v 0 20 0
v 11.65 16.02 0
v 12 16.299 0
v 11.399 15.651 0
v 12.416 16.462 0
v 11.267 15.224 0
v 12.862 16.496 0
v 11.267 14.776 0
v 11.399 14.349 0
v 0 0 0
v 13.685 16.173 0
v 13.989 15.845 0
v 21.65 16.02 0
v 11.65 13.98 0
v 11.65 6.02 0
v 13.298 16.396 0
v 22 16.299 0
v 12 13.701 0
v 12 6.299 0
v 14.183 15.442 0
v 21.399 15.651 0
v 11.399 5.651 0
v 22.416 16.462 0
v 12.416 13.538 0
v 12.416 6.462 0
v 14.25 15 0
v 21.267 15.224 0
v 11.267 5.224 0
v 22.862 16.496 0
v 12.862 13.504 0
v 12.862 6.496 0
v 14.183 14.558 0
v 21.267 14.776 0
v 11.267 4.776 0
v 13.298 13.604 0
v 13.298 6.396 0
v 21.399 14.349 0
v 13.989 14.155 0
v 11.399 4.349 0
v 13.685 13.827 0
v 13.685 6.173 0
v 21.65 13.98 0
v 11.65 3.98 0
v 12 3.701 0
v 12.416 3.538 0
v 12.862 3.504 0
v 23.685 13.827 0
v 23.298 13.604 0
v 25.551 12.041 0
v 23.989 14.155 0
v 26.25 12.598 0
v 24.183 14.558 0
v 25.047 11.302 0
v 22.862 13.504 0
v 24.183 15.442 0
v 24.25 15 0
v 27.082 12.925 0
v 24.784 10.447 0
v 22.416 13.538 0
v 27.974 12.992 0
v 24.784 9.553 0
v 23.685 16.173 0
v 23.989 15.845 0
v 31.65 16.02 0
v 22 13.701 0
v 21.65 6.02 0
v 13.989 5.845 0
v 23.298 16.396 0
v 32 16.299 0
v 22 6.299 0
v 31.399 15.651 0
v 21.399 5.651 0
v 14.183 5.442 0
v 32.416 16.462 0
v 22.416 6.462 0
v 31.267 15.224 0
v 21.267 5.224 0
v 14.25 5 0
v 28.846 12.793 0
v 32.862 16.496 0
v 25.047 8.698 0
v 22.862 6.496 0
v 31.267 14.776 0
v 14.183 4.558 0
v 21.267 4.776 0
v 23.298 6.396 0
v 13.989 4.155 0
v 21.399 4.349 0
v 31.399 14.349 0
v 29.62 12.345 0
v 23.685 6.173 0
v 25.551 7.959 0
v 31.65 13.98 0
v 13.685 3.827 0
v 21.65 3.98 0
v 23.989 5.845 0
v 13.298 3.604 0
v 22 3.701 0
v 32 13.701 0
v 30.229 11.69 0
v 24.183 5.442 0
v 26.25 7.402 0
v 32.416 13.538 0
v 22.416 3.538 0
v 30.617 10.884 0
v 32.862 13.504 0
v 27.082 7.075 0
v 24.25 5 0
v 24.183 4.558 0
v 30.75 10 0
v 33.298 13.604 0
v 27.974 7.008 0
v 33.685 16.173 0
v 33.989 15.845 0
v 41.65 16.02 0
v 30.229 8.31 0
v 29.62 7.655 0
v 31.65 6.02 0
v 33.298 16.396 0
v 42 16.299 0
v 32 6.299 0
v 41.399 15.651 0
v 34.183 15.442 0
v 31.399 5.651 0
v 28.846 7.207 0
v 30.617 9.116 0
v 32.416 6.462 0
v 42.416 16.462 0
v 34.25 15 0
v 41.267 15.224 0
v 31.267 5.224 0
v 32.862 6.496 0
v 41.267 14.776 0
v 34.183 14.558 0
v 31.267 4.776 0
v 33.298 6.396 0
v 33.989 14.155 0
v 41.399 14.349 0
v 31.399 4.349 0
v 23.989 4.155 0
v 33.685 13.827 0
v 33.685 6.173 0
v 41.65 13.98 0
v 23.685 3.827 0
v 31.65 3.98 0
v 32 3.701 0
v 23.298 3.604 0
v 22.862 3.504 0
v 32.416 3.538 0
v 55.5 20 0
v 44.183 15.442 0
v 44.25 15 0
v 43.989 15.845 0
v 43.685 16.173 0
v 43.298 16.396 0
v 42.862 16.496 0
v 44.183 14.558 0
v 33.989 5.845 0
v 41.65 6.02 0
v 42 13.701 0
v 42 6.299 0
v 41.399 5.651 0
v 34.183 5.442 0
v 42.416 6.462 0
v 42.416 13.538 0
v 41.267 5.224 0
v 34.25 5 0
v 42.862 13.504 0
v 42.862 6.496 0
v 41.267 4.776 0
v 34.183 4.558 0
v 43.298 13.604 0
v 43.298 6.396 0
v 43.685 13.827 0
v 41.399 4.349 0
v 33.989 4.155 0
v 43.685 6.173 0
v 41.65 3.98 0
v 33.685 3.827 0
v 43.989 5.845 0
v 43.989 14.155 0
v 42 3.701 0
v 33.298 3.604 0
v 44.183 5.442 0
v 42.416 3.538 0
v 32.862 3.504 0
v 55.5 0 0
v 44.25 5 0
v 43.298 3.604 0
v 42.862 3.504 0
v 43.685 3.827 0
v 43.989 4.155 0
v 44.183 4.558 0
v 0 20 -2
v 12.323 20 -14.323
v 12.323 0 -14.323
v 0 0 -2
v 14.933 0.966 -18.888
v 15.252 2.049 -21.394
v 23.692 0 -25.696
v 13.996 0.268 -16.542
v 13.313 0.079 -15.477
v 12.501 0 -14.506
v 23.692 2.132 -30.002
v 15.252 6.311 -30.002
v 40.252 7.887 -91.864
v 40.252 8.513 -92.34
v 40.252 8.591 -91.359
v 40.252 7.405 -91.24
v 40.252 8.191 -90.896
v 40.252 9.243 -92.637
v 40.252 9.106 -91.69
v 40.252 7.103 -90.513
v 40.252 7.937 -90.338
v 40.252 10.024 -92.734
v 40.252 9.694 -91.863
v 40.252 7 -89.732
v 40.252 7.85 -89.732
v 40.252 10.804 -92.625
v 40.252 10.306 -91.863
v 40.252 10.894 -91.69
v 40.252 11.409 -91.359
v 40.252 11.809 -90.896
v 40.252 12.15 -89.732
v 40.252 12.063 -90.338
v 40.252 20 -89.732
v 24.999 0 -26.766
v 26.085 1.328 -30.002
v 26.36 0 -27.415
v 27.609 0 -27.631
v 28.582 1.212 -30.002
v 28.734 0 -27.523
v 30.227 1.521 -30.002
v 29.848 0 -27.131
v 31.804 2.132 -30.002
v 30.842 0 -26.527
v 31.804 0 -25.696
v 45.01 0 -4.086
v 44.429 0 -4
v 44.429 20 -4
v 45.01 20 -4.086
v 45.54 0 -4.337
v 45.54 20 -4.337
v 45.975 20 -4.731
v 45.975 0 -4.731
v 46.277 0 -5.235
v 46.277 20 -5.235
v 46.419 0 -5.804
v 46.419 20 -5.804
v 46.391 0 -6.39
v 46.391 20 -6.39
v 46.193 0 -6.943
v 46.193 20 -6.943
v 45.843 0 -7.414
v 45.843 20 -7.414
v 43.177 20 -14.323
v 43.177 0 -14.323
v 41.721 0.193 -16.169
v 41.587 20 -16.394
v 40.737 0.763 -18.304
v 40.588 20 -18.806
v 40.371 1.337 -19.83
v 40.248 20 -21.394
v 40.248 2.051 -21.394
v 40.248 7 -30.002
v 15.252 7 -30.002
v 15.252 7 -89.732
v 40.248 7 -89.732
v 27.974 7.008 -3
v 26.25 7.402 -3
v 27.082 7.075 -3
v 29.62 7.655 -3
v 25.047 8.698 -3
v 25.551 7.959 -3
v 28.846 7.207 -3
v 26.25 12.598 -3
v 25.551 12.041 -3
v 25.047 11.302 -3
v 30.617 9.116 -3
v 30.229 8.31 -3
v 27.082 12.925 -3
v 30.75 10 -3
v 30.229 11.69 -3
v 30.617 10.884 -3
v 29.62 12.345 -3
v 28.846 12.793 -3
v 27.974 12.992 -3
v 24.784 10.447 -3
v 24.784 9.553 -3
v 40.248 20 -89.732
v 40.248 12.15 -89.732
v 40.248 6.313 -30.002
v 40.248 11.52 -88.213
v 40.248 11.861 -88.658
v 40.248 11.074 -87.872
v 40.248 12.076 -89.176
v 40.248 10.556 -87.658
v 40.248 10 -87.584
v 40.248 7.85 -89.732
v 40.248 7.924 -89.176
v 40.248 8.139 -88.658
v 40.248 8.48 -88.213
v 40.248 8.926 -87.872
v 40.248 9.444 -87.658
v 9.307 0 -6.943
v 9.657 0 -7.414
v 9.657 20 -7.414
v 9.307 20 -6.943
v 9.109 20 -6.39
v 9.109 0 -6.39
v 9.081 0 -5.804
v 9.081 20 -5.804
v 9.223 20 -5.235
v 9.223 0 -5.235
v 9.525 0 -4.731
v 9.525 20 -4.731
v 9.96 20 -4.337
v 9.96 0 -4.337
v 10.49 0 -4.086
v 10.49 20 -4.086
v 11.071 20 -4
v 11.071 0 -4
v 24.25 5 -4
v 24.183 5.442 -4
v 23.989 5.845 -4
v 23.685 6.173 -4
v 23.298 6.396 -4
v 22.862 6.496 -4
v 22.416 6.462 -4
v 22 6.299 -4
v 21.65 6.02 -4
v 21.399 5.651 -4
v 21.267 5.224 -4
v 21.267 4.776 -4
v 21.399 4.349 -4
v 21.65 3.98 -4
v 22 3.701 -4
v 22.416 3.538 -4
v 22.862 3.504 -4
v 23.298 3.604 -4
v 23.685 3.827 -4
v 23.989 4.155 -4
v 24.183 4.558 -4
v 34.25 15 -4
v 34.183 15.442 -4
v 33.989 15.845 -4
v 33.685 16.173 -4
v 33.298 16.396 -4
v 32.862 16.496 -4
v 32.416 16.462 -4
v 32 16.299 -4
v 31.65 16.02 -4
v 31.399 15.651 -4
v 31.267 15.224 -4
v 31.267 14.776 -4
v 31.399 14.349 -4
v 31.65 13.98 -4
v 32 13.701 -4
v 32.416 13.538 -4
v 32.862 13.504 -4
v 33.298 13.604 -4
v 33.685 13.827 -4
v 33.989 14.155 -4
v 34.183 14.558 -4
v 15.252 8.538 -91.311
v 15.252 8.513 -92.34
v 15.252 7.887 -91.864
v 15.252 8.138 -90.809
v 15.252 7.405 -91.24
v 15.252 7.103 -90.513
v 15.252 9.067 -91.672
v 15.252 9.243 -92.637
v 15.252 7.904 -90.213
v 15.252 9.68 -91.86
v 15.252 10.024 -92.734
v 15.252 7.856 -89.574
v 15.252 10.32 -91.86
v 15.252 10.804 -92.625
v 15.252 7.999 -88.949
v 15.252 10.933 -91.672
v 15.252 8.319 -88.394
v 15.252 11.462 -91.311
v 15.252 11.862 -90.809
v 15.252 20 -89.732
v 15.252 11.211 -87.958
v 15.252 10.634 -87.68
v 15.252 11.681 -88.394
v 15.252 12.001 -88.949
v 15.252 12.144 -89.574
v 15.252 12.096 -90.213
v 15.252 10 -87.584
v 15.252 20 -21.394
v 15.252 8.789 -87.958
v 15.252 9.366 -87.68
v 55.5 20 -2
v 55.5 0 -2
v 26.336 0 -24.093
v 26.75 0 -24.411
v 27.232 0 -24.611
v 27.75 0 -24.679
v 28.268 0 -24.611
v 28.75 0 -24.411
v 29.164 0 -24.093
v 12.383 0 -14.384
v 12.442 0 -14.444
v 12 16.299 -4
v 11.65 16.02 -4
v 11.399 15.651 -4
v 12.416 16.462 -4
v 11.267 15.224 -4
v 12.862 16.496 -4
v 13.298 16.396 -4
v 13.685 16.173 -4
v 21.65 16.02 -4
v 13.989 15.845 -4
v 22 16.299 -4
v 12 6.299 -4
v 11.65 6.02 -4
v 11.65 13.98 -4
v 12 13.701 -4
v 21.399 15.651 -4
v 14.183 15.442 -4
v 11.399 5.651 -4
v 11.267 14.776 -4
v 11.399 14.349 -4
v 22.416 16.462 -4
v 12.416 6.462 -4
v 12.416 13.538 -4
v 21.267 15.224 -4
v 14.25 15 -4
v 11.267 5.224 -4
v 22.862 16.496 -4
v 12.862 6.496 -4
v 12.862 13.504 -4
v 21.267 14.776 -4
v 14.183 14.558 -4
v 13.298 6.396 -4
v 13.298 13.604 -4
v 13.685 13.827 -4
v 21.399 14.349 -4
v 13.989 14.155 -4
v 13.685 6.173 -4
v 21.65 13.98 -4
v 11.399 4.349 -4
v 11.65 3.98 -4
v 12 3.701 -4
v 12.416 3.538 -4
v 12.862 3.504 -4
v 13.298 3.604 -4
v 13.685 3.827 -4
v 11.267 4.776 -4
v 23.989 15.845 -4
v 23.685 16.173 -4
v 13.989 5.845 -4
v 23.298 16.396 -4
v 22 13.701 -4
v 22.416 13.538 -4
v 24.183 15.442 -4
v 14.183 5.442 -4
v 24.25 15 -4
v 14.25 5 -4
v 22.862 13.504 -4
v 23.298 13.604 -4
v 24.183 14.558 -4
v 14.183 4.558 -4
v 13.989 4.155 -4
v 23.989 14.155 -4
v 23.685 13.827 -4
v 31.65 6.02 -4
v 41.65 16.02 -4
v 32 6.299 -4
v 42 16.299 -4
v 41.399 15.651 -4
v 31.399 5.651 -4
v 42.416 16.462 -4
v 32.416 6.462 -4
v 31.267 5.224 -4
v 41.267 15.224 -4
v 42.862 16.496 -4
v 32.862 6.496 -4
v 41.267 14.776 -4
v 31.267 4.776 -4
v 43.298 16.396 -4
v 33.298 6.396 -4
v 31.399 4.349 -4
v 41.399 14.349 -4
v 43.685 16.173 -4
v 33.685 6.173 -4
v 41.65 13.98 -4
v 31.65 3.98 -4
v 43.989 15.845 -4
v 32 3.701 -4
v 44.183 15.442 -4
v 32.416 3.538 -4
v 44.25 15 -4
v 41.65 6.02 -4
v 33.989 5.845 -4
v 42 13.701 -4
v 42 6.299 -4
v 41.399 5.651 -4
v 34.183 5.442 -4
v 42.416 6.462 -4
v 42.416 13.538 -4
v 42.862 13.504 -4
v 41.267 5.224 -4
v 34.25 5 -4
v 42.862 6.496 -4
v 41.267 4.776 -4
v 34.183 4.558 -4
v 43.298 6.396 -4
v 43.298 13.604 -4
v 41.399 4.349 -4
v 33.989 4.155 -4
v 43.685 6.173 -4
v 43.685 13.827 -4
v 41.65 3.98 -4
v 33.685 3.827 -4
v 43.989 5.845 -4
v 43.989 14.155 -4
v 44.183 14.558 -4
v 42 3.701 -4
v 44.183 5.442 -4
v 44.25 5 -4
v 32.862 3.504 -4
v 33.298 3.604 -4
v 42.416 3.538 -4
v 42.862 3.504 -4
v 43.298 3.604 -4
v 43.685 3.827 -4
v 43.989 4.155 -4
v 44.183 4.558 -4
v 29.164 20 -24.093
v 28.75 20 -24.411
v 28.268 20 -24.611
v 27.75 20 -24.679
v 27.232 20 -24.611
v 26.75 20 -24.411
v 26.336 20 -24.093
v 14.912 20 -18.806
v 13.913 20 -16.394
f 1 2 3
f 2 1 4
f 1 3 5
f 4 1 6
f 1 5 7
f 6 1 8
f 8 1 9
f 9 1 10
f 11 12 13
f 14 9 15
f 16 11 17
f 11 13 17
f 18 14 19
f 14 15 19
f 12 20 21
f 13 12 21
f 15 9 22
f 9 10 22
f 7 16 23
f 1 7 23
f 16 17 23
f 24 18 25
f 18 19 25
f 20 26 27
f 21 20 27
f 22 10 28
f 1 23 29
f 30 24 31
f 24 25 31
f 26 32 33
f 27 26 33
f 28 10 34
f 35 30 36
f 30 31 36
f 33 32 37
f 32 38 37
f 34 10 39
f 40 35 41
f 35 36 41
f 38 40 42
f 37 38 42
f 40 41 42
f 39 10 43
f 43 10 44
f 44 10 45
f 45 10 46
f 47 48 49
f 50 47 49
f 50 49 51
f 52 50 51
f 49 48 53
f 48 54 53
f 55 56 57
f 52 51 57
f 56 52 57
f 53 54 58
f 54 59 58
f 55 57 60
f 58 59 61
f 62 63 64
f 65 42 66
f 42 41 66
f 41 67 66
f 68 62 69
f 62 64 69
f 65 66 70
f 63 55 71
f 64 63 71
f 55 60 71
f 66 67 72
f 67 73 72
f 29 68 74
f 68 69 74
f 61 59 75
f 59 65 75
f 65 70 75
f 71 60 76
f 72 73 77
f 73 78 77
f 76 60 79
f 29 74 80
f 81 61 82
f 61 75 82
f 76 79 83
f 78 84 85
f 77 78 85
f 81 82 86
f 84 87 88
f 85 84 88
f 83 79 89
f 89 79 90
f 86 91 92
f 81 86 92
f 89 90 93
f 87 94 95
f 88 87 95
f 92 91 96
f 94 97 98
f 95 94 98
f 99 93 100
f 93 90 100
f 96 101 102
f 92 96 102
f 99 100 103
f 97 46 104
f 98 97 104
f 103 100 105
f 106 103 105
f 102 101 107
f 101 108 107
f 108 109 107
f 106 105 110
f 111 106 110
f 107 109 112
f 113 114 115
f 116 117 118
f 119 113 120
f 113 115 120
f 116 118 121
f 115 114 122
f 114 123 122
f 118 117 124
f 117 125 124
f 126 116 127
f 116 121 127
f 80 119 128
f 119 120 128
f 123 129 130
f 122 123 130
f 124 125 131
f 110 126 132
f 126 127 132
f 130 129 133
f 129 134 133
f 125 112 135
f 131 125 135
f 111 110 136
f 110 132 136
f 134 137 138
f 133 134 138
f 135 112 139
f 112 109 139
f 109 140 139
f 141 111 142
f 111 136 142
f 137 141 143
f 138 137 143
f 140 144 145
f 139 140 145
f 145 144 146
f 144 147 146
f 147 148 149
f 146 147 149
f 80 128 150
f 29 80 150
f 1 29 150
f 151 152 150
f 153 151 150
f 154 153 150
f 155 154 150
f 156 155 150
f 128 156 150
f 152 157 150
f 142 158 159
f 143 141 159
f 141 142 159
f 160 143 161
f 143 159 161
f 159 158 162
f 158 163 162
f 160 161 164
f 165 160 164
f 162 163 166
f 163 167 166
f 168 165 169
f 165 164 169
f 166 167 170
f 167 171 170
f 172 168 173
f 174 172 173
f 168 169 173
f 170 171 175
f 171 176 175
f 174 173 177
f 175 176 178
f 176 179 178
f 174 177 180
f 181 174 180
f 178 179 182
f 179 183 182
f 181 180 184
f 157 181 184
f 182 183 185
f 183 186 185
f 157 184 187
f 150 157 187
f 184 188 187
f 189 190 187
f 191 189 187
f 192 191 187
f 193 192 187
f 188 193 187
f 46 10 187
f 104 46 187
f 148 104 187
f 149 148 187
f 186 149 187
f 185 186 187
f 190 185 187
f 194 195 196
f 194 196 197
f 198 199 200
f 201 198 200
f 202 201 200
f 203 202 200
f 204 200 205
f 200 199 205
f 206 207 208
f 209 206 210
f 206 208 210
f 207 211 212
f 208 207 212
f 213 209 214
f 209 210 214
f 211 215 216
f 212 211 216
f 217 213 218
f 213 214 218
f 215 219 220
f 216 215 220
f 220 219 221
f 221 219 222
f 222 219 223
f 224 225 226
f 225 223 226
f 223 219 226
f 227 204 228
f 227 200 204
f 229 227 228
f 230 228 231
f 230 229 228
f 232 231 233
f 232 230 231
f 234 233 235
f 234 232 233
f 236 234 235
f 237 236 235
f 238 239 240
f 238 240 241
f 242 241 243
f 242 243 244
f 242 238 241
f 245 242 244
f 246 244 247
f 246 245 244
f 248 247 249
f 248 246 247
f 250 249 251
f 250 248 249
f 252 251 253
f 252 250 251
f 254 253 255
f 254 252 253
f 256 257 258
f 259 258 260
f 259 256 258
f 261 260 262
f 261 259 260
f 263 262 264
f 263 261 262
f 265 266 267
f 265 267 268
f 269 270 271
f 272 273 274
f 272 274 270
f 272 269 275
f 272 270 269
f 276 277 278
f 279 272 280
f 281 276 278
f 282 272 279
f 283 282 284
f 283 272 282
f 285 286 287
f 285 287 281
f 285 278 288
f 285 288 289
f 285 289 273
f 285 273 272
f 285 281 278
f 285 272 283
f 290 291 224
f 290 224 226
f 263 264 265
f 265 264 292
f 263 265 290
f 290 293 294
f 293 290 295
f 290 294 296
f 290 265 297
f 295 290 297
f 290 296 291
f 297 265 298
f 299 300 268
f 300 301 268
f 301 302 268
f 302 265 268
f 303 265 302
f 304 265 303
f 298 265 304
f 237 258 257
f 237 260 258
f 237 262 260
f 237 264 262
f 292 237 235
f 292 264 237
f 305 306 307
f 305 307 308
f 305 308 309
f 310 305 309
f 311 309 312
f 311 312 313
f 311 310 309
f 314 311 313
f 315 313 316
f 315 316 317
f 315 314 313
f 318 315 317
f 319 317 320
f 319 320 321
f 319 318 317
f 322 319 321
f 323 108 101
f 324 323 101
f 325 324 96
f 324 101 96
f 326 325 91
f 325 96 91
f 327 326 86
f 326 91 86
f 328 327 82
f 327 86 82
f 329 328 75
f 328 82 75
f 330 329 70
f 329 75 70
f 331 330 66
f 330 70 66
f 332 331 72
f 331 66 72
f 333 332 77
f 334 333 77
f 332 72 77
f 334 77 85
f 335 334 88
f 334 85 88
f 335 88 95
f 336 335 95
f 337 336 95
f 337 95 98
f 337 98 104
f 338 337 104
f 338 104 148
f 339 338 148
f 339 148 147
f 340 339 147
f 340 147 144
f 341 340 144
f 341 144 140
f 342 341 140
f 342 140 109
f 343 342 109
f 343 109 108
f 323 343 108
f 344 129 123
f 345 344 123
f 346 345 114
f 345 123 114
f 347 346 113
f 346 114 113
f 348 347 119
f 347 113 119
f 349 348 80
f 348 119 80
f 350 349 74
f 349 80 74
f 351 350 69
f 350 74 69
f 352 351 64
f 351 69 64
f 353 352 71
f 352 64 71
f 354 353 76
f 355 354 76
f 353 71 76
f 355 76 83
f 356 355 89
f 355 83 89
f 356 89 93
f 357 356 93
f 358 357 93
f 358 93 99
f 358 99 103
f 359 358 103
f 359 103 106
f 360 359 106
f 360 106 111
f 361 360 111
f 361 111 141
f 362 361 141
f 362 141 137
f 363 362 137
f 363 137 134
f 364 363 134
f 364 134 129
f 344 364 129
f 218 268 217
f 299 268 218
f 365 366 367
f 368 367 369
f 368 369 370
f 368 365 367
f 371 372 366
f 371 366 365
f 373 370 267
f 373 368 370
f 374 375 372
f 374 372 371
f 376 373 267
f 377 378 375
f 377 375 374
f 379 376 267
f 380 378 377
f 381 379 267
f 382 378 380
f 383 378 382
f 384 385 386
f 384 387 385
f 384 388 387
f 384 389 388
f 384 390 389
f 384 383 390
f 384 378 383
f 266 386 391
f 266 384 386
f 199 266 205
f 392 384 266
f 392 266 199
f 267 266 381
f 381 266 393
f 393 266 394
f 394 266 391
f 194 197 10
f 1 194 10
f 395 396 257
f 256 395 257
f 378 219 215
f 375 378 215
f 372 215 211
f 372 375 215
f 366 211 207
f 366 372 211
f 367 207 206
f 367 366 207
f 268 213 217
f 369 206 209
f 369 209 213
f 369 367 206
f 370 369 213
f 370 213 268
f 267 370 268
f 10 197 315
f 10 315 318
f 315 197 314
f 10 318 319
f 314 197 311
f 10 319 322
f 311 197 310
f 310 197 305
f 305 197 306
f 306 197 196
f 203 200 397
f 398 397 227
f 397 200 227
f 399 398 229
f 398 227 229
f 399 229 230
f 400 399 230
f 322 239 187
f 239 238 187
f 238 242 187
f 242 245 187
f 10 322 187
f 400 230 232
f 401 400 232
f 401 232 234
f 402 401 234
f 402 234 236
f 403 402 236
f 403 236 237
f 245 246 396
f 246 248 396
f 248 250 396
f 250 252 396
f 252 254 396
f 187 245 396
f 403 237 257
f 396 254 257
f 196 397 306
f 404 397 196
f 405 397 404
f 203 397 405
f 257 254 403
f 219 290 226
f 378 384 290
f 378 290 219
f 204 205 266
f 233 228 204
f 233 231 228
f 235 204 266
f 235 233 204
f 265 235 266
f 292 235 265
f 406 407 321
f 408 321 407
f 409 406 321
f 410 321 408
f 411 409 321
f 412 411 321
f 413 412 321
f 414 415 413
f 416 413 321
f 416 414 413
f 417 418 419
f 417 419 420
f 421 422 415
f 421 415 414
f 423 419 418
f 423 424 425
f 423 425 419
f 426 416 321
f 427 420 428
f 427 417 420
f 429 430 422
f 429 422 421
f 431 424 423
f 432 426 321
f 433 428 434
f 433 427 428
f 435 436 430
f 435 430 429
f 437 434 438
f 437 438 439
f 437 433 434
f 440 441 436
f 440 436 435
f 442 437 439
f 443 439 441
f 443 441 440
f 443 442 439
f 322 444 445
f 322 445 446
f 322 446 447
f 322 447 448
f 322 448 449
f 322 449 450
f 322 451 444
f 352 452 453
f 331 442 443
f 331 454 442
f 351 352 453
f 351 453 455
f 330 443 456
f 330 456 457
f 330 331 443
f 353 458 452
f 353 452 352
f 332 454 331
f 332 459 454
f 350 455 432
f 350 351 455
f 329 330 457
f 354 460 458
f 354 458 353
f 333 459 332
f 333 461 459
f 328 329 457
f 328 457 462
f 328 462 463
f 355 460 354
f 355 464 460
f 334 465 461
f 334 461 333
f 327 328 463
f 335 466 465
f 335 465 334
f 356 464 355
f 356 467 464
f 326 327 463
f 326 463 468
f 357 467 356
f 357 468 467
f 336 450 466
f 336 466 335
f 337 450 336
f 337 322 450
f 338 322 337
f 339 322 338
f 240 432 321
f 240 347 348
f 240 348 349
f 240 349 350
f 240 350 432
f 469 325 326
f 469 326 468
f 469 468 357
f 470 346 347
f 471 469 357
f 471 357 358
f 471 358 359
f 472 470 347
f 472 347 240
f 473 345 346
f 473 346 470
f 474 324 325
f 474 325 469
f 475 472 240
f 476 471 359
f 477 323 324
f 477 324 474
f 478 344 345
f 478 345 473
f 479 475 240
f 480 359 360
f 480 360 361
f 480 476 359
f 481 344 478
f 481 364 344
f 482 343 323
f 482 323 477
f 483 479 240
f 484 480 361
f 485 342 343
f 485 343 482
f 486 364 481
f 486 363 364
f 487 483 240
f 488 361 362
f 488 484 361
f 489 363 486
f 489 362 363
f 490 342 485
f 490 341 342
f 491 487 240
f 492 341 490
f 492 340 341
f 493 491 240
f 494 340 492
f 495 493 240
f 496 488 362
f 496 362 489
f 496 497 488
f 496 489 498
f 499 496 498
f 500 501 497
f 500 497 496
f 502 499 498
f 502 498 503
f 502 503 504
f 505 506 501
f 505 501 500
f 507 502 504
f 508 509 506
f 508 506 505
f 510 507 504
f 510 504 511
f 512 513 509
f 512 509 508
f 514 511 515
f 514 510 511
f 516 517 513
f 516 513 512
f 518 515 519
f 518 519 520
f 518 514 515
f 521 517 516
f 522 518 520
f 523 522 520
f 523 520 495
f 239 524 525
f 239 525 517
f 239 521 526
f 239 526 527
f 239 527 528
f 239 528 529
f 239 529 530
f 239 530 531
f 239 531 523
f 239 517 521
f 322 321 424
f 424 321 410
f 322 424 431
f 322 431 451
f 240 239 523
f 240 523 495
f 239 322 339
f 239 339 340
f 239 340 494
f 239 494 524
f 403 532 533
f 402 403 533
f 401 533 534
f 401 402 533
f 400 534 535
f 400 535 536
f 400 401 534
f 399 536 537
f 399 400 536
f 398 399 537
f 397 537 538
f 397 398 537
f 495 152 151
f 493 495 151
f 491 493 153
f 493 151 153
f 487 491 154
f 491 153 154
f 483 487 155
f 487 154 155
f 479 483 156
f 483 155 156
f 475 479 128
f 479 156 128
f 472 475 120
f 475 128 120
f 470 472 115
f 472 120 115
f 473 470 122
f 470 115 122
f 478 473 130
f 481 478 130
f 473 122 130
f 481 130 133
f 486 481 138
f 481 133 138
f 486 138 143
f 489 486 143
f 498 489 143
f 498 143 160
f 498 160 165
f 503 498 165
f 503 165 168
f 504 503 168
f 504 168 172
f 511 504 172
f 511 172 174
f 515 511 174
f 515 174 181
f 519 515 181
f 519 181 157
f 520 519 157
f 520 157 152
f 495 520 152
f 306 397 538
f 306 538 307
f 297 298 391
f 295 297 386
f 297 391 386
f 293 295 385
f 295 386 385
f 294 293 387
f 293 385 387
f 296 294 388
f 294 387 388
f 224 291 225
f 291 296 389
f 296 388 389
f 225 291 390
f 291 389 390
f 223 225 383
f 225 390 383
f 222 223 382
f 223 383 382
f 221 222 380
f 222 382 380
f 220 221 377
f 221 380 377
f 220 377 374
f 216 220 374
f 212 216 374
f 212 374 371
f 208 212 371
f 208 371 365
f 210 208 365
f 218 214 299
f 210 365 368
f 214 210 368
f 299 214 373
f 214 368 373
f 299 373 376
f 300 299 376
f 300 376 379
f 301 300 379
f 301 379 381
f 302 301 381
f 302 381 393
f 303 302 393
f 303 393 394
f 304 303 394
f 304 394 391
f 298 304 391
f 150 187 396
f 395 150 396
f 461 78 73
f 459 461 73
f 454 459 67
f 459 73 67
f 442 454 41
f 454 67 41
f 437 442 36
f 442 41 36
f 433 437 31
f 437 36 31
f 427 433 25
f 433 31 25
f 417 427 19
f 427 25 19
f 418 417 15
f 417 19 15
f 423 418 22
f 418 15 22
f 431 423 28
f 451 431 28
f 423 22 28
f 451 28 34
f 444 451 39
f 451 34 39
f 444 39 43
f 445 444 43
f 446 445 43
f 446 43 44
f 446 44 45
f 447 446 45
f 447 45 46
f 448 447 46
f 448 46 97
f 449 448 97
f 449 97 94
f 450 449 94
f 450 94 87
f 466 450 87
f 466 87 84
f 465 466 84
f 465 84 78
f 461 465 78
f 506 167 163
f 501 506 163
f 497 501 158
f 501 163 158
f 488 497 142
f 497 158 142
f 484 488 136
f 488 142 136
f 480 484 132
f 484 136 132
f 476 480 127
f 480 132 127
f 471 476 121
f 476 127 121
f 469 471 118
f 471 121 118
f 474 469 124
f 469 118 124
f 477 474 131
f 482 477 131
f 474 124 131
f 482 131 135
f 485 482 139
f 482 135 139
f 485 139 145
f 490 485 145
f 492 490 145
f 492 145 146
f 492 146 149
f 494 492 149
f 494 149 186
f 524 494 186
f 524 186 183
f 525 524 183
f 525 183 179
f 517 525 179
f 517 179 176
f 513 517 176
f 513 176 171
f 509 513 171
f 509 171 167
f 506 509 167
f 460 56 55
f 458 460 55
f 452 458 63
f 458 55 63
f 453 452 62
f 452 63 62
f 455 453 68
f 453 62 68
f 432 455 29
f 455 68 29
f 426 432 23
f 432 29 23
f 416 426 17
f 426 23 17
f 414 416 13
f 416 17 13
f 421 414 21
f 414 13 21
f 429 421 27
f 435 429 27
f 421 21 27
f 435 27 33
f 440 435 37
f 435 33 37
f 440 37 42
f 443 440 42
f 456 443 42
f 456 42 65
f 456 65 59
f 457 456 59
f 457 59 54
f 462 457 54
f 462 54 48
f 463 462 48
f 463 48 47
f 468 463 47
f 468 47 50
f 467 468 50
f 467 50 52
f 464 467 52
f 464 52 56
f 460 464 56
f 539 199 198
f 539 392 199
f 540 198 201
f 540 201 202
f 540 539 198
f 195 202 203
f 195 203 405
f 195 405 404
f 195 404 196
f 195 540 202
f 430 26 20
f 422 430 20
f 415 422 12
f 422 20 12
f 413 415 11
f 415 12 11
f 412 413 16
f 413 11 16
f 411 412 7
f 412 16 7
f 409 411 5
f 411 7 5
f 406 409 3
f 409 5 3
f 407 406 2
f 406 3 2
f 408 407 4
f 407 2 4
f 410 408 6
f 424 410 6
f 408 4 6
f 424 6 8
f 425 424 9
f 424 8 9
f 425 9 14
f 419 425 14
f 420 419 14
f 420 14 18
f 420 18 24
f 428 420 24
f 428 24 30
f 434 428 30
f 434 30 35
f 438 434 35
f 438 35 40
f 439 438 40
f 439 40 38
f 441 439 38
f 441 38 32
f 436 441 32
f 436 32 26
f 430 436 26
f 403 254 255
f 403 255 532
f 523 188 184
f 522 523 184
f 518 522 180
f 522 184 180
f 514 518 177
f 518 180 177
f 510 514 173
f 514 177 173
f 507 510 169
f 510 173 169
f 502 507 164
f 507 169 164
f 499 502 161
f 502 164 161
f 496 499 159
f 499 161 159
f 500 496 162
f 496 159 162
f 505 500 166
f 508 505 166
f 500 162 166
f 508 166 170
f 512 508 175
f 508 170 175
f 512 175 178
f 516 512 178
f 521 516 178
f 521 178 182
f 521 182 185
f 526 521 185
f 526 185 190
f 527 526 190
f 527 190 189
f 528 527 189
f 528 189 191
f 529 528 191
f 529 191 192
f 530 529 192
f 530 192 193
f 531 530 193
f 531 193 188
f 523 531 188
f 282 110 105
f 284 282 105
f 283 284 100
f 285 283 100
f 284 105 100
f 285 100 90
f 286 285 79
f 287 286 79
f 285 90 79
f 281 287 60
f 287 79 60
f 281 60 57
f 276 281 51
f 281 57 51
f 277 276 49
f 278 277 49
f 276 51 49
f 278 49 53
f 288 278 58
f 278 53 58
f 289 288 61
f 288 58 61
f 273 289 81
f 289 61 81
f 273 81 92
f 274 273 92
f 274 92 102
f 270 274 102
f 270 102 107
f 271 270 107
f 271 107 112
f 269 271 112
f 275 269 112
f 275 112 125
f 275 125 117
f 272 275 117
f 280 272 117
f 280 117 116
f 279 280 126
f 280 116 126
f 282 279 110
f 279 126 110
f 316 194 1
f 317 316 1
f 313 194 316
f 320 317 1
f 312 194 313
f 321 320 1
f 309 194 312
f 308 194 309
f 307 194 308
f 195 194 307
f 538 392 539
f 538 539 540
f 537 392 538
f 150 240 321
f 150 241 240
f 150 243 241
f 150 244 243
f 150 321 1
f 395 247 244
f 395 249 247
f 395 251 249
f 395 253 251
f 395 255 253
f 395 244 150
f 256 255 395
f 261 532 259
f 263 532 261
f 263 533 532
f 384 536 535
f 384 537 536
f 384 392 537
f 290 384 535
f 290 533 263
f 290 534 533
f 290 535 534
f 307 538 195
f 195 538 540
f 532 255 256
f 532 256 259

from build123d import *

# Parameters (mm, degrees)
EXTRUDE_1_DEPTH     = 20
SKETCH_2_R          = 1.5
CUT_EXTRUDE_1_DEPTH = 5
SKETCH_3_R          = 3
CUT_EXTRUDE_2_DEPTH = 3
SKETCH_4_W          = 24.99770673
SKETCH_4_H          = 59.73
CUT_EXTRUDE_3_DEPTH = 7
EXTRUDE_2_DEPTH     = 25
SKETCH_6_R          = 2.15
CUT_EXTRUDE_4_DEPTH = 41.24770673
CUT_EXTRUDE_9_DEPTH = 10
FILLET_3_R          = 10
FILLET_4_R          = 10


with BuildPart() as part:
    # 스케치1 → 보스-돌출1 (new body)
    with BuildSketch(Plane(origin=(0, 0, 0), x_dir=(1, 0, 0), z_dir=(0, 1, 0))):
        Polygon((40.24770673, 89.73229327), (15.25229327, 89.73229327), (15.25229327, 17.25229327), (0, 2), (0, 0), (55.5, 0), (55.5, 2), (40.24770673, 17.25229327), align=None)
        with BuildLine():
            Line((11.071067812, 4), (44.428932188, 4))
            ThreePointArc((44.428932188, 4), (46.276691253, 5.234633135), (45.843145751, 7.414213562))
            Line((45.843145751, 7.414213562), (29.164213562, 24.093145751))
            ThreePointArc((29.164213562, 24.093145751), (27.75, 24.678932188), (26.335786438, 24.093145751))
            Line((26.335786438, 24.093145751), (9.656854249, 7.414213562))
            ThreePointArc((9.656854249, 7.414213562), (9.223308747, 5.234633135), (11.071067812, 4))
        make_face(mode=Mode.SUBTRACT)
    extrude(amount=EXTRUDE_1_DEPTH)

    # 스케치2 → 컷-돌출1 (cut)
    with BuildSketch(Plane.XY):
        with Locations((12.75, 15)):
            Circle(SKETCH_2_R)
        with Locations((22.75, 15)):
            Circle(SKETCH_2_R)
        with Locations((32.75, 15)):
            Circle(SKETCH_2_R)
        with Locations((42.75, 15)):
            Circle(SKETCH_2_R)
        with Locations((42.75, 5)):
            Circle(SKETCH_2_R)
        with Locations((32.75, 5)):
            Circle(SKETCH_2_R)
        with Locations((22.75, 5)):
            Circle(SKETCH_2_R)
        with Locations((12.75, 5)):
            Circle(SKETCH_2_R)
    extrude(amount=-CUT_EXTRUDE_1_DEPTH, mode=Mode.SUBTRACT)

    # 스케치3 → 컷-돌출2 (cut)
    with BuildSketch(Plane.XY):
        with Locations((27.75, 10)):
            Circle(SKETCH_3_R)
    extrude(amount=-CUT_EXTRUDE_2_DEPTH, mode=Mode.SUBTRACT)

    # 스케치4 → 컷-돌출3 (cut)
    with BuildSketch(Plane.XZ):
        with Locations((27.748853365, -59.86729327)):
            Rectangle(SKETCH_4_W, SKETCH_4_H)
    extrude(amount=-CUT_EXTRUDE_3_DEPTH, mode=Mode.SUBTRACT)

    # 스케치5 → 보스-돌출2 (add)
    with BuildSketch(Plane.ZY.offset(-15.25229327)):
        with BuildLine():
            Line((-89.73229327, 20), (-92.624677966, 10.804147089))
            ThreePointArc((-92.624677966, 10.804147089), (-92.122576041, 8.184258847), (-89.73229327, 7))
            Line((-89.73229327, 7), (-89.73229327, 20))
        make_face()
    extrude(amount=-EXTRUDE_2_DEPTH)

    # 스케치6 → 컷-돌출4 (cut, through all)
    with BuildSketch(Plane.ZY.offset(-15.25229327)):
        with Locations((-89.734462369, 9.999999216)):
            Circle(SKETCH_6_R)
    extrude(amount=-CUT_EXTRUDE_4_DEPTH, mode=Mode.SUBTRACT)

    # 스케치12 → 컷-돌출9 (cut)
    with BuildSketch(Plane(origin=(9.45846044, -19.103311951, -9.45846044), x_dir=(-0.707106781, 0, -0.707106781), z_dir=(0.405579788, -0.819152044, -0.405579788))):
        Polygon((-16.260212793, 33.305608007), (3.048063237, 33.305608007), (-6.606074778, 45.231574441), align=None)
    cut_extrude_9 = extrude(amount=CUT_EXTRUDE_9_DEPTH, mode=Mode.SUBTRACT)

    # 대칭 복사2: 컷-돌출9 across plane
    add(cut_extrude_9.mirror(Plane(origin=(27.74770673, 0, 0), x_dir=(0, 0, 1), z_dir=(1, 0, 0))), mode=Mode.SUBTRACT)

    # 필렛3
    fillet_3_edges = [part.edges().sort_by_distance(p)[0] for p in [
        (27.74770673, 0.061890187, -29.87729327),
    ]]
    fillet(fillet_3_edges, radius=FILLET_3_R)

    # 필렛4
    fillet_4_edges = [part.edges().sort_by_distance(p)[0] for p in [
        (15.25229327, 10, -17.25229327),
        (40.24770673, 10, -17.25229327),
    ]]
    fillet(fillet_4_edges, radius=FILLET_4_R)


solid = part.part
